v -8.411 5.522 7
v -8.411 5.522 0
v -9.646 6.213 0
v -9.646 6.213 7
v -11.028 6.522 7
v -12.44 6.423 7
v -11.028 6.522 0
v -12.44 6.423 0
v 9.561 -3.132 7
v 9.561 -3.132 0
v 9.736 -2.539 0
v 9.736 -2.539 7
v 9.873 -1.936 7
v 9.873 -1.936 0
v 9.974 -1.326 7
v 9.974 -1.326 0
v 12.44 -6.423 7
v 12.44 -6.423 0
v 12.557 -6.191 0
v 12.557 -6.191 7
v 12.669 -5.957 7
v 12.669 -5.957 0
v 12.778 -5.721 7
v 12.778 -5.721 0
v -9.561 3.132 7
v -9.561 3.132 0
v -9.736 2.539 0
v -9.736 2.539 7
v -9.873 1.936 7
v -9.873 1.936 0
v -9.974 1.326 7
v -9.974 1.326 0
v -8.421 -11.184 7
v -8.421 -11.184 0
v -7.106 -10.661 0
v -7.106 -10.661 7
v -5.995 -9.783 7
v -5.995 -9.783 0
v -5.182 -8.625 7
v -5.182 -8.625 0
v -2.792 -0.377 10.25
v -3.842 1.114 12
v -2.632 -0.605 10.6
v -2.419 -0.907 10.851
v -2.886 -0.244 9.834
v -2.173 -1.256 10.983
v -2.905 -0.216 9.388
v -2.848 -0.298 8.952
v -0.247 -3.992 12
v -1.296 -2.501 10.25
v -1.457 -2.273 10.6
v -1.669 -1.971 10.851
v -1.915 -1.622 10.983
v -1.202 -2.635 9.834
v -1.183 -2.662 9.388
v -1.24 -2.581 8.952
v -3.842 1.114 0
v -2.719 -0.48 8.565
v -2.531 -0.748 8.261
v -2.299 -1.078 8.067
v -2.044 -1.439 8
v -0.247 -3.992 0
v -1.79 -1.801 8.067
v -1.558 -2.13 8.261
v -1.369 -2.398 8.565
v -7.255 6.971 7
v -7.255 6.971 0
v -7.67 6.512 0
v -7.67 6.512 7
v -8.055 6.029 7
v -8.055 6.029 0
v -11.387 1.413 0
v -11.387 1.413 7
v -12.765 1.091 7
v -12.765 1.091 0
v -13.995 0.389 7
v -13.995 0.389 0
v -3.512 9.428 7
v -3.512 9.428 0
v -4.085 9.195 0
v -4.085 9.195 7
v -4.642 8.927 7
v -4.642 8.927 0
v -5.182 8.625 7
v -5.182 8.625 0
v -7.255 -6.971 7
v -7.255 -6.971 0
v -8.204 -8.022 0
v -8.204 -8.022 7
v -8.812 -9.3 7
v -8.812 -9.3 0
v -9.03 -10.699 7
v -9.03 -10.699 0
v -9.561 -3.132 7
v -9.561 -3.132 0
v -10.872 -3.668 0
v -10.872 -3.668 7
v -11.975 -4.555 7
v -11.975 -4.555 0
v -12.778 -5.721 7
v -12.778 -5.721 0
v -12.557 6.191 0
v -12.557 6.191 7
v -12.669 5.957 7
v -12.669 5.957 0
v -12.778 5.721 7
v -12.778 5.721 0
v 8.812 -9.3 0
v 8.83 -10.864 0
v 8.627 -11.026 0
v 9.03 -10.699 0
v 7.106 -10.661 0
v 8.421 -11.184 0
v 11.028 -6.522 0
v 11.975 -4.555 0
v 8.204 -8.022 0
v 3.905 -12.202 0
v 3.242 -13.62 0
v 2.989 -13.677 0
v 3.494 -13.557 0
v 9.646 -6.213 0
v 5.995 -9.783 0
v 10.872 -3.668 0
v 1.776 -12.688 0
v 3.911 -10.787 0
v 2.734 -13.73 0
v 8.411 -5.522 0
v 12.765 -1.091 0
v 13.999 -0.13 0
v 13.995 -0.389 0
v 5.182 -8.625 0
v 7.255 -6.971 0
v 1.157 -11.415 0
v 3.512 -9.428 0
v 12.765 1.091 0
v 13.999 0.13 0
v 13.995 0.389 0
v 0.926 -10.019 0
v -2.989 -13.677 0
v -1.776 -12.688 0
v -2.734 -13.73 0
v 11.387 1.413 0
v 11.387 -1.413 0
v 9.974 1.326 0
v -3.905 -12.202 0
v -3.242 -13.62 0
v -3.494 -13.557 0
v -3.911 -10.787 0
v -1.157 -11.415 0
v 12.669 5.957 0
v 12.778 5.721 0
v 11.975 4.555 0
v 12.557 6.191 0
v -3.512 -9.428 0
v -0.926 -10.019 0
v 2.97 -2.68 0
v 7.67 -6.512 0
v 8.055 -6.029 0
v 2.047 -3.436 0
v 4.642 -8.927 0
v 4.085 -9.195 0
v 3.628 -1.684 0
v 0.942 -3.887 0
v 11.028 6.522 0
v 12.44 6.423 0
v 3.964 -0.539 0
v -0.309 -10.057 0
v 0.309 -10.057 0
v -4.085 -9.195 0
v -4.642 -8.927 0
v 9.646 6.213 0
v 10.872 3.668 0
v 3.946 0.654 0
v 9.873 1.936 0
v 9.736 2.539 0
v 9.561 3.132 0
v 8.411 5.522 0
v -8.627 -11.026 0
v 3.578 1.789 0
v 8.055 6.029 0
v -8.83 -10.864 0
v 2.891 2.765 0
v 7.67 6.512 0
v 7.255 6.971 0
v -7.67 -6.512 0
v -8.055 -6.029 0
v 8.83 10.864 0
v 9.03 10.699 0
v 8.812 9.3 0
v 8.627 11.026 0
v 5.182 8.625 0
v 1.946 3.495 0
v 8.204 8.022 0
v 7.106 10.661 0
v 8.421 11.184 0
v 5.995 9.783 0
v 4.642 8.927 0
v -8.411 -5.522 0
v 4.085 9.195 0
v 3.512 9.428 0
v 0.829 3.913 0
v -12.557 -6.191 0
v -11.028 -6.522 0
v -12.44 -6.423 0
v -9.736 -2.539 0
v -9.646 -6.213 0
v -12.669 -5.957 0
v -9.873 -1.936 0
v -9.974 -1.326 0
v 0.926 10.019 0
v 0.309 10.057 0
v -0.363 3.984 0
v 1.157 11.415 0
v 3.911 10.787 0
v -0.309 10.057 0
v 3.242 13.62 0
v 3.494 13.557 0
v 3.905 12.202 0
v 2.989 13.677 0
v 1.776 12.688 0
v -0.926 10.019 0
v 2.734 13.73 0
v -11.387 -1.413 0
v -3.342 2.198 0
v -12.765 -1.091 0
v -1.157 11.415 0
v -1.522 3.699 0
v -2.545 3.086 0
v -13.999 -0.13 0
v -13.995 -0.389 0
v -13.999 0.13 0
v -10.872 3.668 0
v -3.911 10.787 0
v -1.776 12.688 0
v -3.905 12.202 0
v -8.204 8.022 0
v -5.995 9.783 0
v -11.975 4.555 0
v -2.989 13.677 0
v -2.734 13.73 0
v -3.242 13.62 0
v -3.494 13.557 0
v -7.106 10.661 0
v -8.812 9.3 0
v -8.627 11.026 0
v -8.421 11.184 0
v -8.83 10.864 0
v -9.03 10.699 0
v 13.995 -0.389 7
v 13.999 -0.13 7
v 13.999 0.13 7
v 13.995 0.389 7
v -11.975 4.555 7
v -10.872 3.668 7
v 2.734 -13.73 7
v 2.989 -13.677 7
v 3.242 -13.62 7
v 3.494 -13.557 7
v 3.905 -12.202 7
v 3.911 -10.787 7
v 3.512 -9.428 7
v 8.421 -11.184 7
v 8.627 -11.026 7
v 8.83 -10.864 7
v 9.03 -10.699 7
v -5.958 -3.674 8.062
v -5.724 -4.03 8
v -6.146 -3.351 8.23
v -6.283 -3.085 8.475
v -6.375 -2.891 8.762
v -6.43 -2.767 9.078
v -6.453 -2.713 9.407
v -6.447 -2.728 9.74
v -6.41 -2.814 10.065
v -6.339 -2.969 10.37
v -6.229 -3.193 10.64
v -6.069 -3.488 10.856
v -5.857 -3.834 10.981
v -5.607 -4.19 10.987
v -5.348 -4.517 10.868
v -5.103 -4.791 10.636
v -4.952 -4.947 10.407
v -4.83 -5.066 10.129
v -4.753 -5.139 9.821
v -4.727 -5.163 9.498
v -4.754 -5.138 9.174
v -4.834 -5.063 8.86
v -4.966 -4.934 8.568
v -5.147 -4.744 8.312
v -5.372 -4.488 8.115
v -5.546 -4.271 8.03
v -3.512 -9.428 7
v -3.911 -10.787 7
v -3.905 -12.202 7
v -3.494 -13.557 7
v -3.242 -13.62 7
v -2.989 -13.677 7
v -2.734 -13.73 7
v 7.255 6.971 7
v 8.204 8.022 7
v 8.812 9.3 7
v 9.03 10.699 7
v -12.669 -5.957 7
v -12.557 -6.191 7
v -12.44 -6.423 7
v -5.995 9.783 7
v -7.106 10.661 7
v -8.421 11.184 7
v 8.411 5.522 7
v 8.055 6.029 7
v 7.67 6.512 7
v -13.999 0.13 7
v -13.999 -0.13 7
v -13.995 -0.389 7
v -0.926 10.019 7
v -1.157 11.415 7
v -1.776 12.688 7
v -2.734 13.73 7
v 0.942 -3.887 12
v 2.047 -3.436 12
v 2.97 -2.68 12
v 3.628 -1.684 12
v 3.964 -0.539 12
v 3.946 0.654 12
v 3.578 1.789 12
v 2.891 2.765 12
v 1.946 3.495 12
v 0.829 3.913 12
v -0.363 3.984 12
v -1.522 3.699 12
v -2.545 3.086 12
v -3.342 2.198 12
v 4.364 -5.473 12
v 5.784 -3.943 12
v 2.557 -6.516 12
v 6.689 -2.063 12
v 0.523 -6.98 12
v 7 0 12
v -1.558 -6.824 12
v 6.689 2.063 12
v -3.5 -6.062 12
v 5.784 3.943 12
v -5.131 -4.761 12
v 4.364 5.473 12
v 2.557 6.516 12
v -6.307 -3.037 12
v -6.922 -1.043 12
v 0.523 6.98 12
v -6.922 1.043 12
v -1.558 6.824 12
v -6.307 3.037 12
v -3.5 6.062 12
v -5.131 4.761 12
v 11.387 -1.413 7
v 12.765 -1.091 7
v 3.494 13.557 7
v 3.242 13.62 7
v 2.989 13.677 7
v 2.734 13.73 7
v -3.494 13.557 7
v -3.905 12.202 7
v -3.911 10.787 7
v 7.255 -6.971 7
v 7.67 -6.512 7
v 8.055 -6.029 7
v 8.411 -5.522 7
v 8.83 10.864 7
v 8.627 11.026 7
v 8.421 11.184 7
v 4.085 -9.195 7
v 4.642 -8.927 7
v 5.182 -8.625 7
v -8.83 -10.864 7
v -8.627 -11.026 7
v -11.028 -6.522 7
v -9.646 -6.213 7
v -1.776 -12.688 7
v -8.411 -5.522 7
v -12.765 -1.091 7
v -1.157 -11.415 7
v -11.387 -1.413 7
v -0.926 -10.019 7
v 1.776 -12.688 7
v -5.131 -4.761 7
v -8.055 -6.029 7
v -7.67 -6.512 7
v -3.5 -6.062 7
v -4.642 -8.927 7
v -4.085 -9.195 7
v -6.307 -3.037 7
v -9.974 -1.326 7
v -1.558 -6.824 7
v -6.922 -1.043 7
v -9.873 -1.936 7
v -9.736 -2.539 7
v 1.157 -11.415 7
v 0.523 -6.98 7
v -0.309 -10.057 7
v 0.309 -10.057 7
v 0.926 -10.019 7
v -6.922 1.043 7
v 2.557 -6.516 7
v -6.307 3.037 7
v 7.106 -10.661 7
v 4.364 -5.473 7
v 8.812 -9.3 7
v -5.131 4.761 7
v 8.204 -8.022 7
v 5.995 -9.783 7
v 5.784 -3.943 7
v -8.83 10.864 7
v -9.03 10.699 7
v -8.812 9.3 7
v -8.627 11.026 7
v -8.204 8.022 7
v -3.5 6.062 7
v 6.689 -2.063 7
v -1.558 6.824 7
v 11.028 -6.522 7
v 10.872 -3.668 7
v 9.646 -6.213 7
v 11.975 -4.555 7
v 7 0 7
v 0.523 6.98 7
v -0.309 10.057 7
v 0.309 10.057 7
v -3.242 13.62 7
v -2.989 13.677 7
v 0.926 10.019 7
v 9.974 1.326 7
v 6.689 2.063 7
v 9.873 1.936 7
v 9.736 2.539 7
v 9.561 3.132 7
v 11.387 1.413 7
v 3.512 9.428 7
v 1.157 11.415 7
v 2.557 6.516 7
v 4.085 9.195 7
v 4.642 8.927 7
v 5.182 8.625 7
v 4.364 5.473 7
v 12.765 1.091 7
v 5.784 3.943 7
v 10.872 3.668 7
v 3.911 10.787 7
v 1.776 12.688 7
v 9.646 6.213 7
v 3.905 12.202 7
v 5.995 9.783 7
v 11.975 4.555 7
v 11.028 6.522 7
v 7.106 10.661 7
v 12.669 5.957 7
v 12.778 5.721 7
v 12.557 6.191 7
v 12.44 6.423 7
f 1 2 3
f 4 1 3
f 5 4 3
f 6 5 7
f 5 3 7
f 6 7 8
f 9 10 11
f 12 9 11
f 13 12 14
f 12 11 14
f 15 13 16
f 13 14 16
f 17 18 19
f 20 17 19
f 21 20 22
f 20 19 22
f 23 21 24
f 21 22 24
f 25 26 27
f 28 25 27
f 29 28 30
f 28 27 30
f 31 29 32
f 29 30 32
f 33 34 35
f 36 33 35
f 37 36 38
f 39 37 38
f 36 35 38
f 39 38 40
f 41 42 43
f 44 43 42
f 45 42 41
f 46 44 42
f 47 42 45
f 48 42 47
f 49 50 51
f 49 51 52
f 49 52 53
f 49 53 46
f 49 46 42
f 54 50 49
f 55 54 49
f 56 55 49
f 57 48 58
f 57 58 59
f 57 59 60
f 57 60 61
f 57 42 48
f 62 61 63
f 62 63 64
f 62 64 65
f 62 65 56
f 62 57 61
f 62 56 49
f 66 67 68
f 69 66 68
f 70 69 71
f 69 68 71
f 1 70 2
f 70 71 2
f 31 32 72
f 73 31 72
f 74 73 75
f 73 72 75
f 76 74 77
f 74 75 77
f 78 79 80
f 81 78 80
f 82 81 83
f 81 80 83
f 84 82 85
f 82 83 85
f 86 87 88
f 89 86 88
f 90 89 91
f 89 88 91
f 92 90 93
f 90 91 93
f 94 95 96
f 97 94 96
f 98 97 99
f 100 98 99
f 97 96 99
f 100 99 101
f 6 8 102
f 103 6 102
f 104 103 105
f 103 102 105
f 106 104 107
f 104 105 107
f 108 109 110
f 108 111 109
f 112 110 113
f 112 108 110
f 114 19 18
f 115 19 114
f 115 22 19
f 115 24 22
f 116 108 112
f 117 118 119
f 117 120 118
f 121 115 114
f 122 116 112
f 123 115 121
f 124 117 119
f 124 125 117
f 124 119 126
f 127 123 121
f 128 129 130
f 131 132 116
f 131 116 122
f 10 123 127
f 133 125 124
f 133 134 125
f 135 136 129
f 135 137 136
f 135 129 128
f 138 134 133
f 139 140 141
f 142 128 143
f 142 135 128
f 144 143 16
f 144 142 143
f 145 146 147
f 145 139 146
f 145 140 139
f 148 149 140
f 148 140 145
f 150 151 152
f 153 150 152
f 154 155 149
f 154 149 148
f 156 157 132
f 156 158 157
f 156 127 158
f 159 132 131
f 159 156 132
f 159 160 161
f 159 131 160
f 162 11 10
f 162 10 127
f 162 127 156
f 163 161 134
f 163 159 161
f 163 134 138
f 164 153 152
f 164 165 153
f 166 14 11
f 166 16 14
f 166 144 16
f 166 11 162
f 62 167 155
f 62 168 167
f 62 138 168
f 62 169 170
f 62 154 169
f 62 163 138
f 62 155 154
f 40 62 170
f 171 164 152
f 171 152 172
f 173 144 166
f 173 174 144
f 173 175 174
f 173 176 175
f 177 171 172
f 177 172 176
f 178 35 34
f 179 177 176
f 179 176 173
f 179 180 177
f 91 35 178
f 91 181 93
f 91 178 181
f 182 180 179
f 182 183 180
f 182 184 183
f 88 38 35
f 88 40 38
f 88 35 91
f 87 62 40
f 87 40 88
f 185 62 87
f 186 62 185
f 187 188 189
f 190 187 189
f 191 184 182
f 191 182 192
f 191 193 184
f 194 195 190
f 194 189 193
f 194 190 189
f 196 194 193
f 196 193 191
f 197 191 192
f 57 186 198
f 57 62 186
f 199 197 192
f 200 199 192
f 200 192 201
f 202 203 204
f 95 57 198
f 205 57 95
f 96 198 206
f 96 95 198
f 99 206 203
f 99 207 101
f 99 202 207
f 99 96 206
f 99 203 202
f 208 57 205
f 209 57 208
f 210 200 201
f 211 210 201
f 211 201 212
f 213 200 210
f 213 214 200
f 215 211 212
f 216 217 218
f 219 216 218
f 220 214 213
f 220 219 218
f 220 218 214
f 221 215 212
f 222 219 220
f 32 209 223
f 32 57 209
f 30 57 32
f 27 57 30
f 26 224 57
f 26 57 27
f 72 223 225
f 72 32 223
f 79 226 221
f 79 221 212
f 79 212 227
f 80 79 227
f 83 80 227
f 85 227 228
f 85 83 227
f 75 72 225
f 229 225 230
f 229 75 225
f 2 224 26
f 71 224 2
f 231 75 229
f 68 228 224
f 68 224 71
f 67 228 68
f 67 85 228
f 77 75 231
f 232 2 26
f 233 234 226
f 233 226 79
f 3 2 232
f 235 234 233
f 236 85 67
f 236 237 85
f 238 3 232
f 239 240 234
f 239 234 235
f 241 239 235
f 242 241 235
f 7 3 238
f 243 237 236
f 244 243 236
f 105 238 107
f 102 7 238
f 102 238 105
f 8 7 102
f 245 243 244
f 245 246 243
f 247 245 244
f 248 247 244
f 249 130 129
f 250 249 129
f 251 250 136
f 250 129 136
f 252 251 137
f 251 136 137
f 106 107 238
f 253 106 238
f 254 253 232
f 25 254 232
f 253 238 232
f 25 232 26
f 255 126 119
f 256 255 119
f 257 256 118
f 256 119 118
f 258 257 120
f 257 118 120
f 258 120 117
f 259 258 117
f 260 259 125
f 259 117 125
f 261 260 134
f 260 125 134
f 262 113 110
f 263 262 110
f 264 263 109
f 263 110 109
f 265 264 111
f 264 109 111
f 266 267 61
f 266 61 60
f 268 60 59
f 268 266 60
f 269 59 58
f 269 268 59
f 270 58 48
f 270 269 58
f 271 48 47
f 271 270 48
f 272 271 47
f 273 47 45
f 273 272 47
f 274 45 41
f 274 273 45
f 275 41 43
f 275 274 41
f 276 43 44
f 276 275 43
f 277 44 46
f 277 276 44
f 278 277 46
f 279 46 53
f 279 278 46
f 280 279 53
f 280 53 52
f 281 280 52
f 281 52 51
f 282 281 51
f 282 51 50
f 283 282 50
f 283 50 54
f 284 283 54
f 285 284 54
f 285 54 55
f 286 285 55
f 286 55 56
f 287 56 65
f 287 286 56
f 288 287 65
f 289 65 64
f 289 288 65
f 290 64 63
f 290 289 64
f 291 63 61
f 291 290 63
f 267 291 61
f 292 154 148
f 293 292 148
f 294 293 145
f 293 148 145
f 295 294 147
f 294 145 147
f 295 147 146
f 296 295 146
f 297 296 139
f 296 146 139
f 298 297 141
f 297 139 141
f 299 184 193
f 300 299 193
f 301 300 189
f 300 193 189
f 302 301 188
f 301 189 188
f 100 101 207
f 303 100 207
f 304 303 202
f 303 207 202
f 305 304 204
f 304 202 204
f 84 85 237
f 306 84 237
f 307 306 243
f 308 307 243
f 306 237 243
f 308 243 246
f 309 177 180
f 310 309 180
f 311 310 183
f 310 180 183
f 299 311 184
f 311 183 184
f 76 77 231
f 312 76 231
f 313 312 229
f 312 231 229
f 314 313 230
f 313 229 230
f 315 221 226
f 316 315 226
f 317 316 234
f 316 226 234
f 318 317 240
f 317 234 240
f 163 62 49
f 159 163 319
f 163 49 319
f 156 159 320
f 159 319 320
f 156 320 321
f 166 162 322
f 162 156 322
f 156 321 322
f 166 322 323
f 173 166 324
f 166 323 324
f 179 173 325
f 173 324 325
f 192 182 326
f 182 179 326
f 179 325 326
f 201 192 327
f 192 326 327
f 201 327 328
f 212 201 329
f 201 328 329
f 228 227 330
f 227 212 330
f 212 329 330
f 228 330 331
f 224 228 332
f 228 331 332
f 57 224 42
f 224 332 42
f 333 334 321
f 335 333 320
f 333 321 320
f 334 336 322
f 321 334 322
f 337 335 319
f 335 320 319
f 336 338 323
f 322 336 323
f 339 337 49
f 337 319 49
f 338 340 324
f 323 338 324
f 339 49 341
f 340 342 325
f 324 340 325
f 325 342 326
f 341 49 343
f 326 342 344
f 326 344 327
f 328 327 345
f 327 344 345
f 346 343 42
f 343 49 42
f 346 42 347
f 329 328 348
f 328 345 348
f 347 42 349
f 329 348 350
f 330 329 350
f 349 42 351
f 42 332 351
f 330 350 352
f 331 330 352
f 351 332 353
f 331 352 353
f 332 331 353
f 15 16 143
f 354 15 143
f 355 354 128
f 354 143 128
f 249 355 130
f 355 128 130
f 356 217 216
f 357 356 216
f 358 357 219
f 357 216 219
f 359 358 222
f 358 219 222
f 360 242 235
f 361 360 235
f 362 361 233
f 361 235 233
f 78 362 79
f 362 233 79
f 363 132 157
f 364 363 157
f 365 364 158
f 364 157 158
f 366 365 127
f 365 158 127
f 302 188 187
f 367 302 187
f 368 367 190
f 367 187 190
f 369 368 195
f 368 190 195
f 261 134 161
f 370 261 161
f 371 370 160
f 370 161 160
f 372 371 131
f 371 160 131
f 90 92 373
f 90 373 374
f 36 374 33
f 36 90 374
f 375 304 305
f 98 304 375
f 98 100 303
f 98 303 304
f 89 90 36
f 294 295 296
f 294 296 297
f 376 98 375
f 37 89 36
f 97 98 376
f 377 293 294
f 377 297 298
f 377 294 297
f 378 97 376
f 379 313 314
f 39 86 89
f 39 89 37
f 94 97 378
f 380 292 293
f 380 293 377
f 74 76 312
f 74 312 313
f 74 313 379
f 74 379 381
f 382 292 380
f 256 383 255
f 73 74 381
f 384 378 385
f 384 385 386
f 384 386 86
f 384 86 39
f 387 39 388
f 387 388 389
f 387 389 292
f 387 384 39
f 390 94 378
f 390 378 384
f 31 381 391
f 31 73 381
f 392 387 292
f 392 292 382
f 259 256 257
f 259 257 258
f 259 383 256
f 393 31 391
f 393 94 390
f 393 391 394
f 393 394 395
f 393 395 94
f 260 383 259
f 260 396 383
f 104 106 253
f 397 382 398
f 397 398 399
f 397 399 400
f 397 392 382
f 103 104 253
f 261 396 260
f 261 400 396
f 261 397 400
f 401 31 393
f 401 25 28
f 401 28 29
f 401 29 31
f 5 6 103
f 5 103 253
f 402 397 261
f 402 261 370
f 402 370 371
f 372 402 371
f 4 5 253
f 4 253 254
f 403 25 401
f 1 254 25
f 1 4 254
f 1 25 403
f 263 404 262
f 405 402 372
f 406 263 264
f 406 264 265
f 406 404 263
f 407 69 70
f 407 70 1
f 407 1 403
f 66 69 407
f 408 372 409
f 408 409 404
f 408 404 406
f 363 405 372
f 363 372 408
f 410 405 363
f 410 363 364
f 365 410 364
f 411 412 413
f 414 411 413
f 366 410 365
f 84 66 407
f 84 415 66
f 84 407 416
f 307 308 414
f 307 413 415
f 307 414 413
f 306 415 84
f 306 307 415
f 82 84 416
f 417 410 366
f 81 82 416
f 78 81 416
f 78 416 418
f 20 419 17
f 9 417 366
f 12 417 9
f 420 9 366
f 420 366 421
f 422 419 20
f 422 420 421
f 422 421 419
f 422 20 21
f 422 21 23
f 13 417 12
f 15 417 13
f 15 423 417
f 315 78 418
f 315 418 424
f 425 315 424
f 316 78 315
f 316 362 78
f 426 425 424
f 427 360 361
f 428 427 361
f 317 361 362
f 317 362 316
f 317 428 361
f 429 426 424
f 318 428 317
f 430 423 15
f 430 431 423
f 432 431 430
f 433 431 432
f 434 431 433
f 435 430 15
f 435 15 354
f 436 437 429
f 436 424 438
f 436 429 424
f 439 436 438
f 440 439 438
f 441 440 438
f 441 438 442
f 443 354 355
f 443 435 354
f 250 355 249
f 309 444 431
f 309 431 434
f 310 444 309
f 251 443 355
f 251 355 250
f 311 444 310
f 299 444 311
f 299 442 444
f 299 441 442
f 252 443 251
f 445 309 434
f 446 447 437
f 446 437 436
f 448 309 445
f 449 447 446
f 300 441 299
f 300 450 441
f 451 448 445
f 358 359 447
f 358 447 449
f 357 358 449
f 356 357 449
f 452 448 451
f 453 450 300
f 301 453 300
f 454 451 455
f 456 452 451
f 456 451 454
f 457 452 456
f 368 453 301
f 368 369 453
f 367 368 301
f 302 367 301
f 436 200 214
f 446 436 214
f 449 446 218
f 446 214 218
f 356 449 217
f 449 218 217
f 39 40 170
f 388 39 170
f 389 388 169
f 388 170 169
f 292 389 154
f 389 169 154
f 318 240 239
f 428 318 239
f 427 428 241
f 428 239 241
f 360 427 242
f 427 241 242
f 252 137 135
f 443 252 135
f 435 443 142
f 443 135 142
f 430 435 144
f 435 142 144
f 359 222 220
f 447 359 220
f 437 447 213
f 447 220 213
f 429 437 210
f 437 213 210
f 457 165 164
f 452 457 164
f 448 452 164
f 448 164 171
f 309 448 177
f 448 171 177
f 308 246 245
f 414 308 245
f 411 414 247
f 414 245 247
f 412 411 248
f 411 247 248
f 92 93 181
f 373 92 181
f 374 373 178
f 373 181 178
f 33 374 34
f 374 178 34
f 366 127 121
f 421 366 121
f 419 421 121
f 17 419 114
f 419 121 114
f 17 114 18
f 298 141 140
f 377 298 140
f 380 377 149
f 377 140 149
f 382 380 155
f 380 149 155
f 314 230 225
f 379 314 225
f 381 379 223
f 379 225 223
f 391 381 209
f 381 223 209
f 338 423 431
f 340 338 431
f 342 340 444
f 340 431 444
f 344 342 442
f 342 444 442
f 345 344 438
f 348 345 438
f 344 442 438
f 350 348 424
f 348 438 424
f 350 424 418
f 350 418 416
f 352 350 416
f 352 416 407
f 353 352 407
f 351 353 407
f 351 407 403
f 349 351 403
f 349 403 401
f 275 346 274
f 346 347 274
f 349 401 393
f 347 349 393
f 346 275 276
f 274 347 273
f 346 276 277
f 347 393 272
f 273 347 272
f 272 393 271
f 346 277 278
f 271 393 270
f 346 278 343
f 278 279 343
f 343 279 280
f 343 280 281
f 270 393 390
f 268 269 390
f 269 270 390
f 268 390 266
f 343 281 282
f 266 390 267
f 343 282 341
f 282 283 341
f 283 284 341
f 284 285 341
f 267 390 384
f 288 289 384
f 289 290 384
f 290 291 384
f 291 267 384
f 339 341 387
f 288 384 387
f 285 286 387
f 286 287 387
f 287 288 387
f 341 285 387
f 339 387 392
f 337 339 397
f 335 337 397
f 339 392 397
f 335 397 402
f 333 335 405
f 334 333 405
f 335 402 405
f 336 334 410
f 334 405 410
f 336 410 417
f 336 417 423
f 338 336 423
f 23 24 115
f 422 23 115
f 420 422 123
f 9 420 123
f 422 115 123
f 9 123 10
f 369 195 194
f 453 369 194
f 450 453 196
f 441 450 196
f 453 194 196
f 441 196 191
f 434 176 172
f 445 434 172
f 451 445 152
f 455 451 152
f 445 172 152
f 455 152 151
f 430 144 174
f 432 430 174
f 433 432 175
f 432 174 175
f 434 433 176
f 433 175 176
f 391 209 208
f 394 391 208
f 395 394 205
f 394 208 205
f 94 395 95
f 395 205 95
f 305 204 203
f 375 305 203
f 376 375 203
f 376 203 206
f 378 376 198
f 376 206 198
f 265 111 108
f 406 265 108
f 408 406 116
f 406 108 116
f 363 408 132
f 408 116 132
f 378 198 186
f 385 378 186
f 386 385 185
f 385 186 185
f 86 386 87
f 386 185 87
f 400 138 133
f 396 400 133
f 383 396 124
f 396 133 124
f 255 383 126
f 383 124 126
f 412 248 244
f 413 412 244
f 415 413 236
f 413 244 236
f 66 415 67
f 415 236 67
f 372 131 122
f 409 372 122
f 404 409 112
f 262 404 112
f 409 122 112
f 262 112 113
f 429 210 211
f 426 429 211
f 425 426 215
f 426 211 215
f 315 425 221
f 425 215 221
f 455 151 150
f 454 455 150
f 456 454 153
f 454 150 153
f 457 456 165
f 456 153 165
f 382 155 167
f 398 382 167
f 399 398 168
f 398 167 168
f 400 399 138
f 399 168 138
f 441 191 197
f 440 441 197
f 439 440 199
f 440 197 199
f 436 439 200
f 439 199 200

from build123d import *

# Parameters (mm, degrees)
BOSS_EXTRUDE1_DEPTH = 7
SKETCH2_R           = 7
SKETCH2_R_2         = 4
BOSS_EXTRUDE2_DEPTH = 5
SKETCH3_R           = 4
CUT_EXTRUDE1_DEPTH  = 15
BOSS_EXTRUDE3_DEPTH = 12
SKETCH5_R           = 1.5
CUT_EXTRUDE2_DEPTH  = 12


with BuildPart() as part:
    # Sketch1 → Boss-Extrude1 (new body)
    with BuildSketch(Plane.XY):
        with BuildLine():
            ThreePointArc((-12.439687438, -6.422941417), (-10.325628022, -6.417742109), (-8.410516827, -5.522407894))
            ThreePointArc((-8.410516827, -5.522407894), (-7.866397461, -6.273242641), (-7.255465658, -6.970796248))
            ThreePointArc((-7.255465658, -6.970796248), (-8.554504306, -8.638661002), (-9.029995733, -10.698559579))
            ThreePointArc((-9.029995733, -10.698559579), (-8.728857226, -10.945640755), (-8.42096127, -11.184248356))
            ThreePointArc((-8.42096127, -11.184248356), (-6.518515447, -10.262307937), (-5.181530838, -8.624704077))
            ThreePointArc((-5.181530838, -8.624704077), (-4.365521241, -9.065098264), (-3.512433539, -9.428498973))
            ThreePointArc((-3.512433539, -9.428498973), (-3.959167524, -11.494824938), (-3.493813999, -13.557037425))
            ThreePointArc((-3.493813999, -13.557037425), (-3.115293075, -13.648990771), (-2.734360446, -13.730377742))
            ThreePointArc((-2.734360446, -13.730377742), (-1.420330943, -12.07429782), (-0.926279119, -10.018771843))
            ThreePointArc((-0.926279119, -10.018771843), (0, -10.0615), (0.926279119, -10.018771843))
            ThreePointArc((0.926279119, -10.018771843), (1.420330943, -12.07429782), (2.734360446, -13.730377742))
            ThreePointArc((2.734360446, -13.730377742), (3.115293075, -13.648990771), (3.493813999, -13.557037425))
            ThreePointArc((3.493813999, -13.557037425), (3.959167524, -11.494824938), (3.512433539, -9.428498973))
            ThreePointArc((3.512433539, -9.428498973), (4.365521241, -9.065098264), (5.181530838, -8.624704077))
            ThreePointArc((5.181530838, -8.624704077), (6.518515447, -10.262307937), (8.42096127, -11.184248356))
            ThreePointArc((8.42096127, -11.184248356), (8.728857226, -10.945640755), (9.029995733, -10.698559579))
            ThreePointArc((9.029995733, -10.698559579), (8.554504306, -8.638661002), (7.255465658, -6.970796248))
            ThreePointArc((7.255465658, -6.970796248), (7.866397461, -6.273242641), (8.410516827, -5.522407894))
            ThreePointArc((8.410516827, -5.522407894), (10.325628022, -6.417742109), (12.439687438, -6.422941417))
            ThreePointArc((12.439687438, -6.422941417), (12.613564151, -6.074372348), (12.777676066, -5.7211008))
            ThreePointArc((12.777676066, -5.7211008), (11.455516597, -4.071504309), (9.561463821, -3.132441835))
            ThreePointArc((9.561463821, -3.132441835), (9.809237188, -2.238894377), (9.97369681, -1.3263311))
            ThreePointArc((9.97369681, -1.3263311), (12.087623332, -1.302063747), (13.994580946, -0.389492158))
            ThreePointArc((13.994580946, -0.389492158), (14, 0), (13.994580946, 0.389492158))
            ThreePointArc((13.994580946, 0.389492158), (12.087623332, 1.302063747), (9.97369681, 1.3263311))
            ThreePointArc((9.97369681, 1.3263311), (9.809237188, 2.238894377), (9.561463821, 3.132441835))
            ThreePointArc((9.561463821, 3.132441835), (11.455516597, 4.071504309), (12.777676066, 5.7211008))
            ThreePointArc((12.777676066, 5.7211008), (12.613564151, 6.074372348), (12.439687438, 6.422941417))
            ThreePointArc((12.439687438, 6.422941417), (10.325628022, 6.417742109), (8.410516827, 5.522407894))
            ThreePointArc((8.410516827, 5.522407894), (7.866397461, 6.273242641), (7.255465658, 6.970796248))
            ThreePointArc((7.255465658, 6.970796248), (8.554504306, 8.638661002), (9.029995733, 10.698559579))
            ThreePointArc((9.029995733, 10.698559579), (8.728857226, 10.945640755), (8.42096127, 11.184248356))
            ThreePointArc((8.42096127, 11.184248356), (6.518515447, 10.262307937), (5.181530838, 8.624704077))
            ThreePointArc((5.181530838, 8.624704077), (4.365521241, 9.065098264), (3.512433539, 9.428498973))
            ThreePointArc((3.512433539, 9.428498973), (3.959167524, 11.494824938), (3.493813999, 13.557037425))
            ThreePointArc((3.493813999, 13.557037425), (3.115293075, 13.648990771), (2.734360446, 13.730377742))
            ThreePointArc((2.734360446, 13.730377742), (1.420330943, 12.07429782), (0.926279119, 10.018771843))
            ThreePointArc((0.926279119, 10.018771843), (0, 10.0615), (-0.926279119, 10.018771843))
            ThreePointArc((-0.926279119, 10.018771843), (-1.420330943, 12.07429782), (-2.734360446, 13.730377742))
            ThreePointArc((-2.734360446, 13.730377742), (-3.115293075, 13.648990771), (-3.493813999, 13.557037425))
            ThreePointArc((-3.493813999, 13.557037425), (-3.959167524, 11.494824938), (-3.512433539, 9.428498973))
            ThreePointArc((-3.512433539, 9.428498973), (-4.365521241, 9.065098264), (-5.181530838, 8.624704077))
            ThreePointArc((-5.181530838, 8.624704077), (-6.518515447, 10.262307937), (-8.42096127, 11.184248356))
            ThreePointArc((-8.42096127, 11.184248356), (-8.728857226, 10.945640755), (-9.029995733, 10.698559579))
            ThreePointArc((-9.029995733, 10.698559579), (-8.554504306, 8.638661002), (-7.255465658, 6.970796248))
            ThreePointArc((-7.255465658, 6.970796248), (-7.866397461, 6.273242641), (-8.410516827, 5.522407894))
            ThreePointArc((-8.410516827, 5.522407894), (-10.325628022, 6.417742109), (-12.439687438, 6.422941417))
            ThreePointArc((-12.439687438, 6.422941417), (-12.613564151, 6.074372348), (-12.777676066, 5.7211008))
            ThreePointArc((-12.777676066, 5.7211008), (-11.455516597, 4.071504309), (-9.561463821, 3.132441835))
            ThreePointArc((-9.561463821, 3.132441835), (-9.809237188, 2.238894377), (-9.97369681, 1.3263311))
            ThreePointArc((-9.97369681, 1.3263311), (-12.087623332, 1.302063747), (-13.994580946, 0.389492158))
            ThreePointArc((-13.994580946, 0.389492158), (-14, 0), (-13.994580946, -0.389492158))
            ThreePointArc((-13.994580946, -0.389492158), (-12.087623332, -1.302063747), (-9.97369681, -1.3263311))
            ThreePointArc((-9.97369681, -1.3263311), (-9.809237188, -2.238894377), (-9.561463821, -3.132441835))
            ThreePointArc((-9.561463821, -3.132441835), (-11.455516597, -4.071504309), (-12.777676066, -5.7211008))
            ThreePointArc((-12.777676066, -5.7211008), (-12.613564151, -6.074372348), (-12.439687438, -6.422941417))
        make_face()
    extrude(amount=BOSS_EXTRUDE1_DEPTH)

    # Sketch2 → Boss-Extrude2 (add)
    with BuildSketch(Plane.XY.offset(7)):
        Circle(SKETCH2_R)
        Circle(SKETCH2_R_2, mode=Mode.SUBTRACT)
    extrude(amount=BOSS_EXTRUDE2_DEPTH)

    # Sketch3 → Cut-Extrude1 (cut)
    with BuildSketch(Plane.XY.offset(7)):
        Circle(SKETCH3_R)
    extrude(amount=-CUT_EXTRUDE1_DEPTH, mode=Mode.SUBTRACT)

    # Sketch4 → Boss-Extrude3 (add)
    with BuildSketch(Plane(origin=(0, 0, 0), x_dir=(-1, 0, 0), z_dir=(0, 0, -1))):
        with BuildLine():
            Line((3.841780502, 1.113877271), (0.246510723, -3.992396832))
            ThreePointArc((0.246510723, -3.992396832), (3.27063298, -2.302815648), (3.841780502, 1.113877271))
        make_face()
    extrude(amount=-BOSS_EXTRUDE3_DEPTH)

    # Sketch5 → Cut-Extrude2 (cut)
    with BuildSketch(Plane(origin=(-10.220728062, -7.196298901, 0), x_dir=(0, 0, -1), z_dir=(0.817658245, 0.575703912, 0))):
        with Locations((-9.5, 0)):
            Circle(SKETCH5_R)
    extrude(amount=CUT_EXTRUDE2_DEPTH, mode=Mode.SUBTRACT)


solid = part.part
